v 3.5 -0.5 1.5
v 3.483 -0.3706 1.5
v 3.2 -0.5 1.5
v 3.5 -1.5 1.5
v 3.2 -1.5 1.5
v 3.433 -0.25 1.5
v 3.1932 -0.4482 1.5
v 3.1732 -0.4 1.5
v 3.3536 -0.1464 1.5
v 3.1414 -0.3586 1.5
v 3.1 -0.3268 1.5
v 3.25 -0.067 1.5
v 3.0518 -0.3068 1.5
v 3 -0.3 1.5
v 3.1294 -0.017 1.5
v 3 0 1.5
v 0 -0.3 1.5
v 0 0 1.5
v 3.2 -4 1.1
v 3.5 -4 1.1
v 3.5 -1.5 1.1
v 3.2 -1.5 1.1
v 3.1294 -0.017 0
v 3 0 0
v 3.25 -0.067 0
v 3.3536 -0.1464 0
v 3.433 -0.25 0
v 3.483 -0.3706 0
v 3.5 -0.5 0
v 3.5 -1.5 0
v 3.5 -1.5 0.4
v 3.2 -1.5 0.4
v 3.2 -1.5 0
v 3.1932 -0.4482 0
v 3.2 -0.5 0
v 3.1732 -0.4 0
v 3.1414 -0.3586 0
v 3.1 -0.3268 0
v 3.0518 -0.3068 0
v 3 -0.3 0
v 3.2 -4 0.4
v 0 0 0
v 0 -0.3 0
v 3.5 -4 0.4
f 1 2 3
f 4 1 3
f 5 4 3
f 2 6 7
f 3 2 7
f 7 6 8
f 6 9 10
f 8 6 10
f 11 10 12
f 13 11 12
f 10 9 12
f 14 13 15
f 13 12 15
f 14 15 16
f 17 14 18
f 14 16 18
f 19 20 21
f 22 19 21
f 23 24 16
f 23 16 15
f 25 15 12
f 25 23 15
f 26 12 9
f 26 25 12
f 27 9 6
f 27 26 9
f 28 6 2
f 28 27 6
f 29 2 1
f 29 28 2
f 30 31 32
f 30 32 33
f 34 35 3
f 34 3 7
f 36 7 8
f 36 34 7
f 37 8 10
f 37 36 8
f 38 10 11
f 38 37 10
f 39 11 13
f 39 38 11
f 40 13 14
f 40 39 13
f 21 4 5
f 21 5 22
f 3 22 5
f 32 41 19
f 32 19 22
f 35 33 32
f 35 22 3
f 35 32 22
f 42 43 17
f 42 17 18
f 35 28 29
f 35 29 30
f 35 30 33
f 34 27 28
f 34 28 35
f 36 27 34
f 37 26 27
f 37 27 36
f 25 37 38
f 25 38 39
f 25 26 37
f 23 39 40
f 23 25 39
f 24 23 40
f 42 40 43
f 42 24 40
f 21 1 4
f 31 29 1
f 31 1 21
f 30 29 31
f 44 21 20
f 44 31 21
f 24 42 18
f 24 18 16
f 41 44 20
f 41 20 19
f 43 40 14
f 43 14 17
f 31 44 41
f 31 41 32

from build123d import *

# Parameters (mm, degrees)
BOSS_EXTRUDE1_DEPTH = 1.5
SKETCH2_W           = 0.4
SKETCH2_H           = 2.5
CUT_EXTRUDE1_DEPTH  = 1.5


with BuildPart() as part:
    # Sketch1 → Boss-Extrude1 (new body)
    with BuildSketch(Plane.XY):
        with BuildLine():
            Line((0, 0), (3, 0))
            ThreePointArc((3, 0), (3.353553391, -0.146446609), (3.5, -0.5))
            Line((3.5, -0.5), (3.5, -4))
            Line((3.5, -4), (3.2, -4))
            Line((3.2, -4), (3.2, -0.5))
            ThreePointArc((3.2, -0.5), (3.141421356, -0.358578644), (3, -0.3))
            Line((3, -0.3), (0, -0.3))
            Line((0, -0.3), (0, 0))
        make_face()
    extrude(amount=BOSS_EXTRUDE1_DEPTH)

    # Sketch2 → Cut-Extrude1 (cut)
    with BuildSketch(Plane(origin=(3.5, 0, 0), x_dir=(0, 0, -1), z_dir=(1, 0, 0))):
        with Locations((-1.3, -2.75)):
            Rectangle(SKETCH2_W, SKETCH2_H)
        with Locations((-0.2, -2.75)):
            Rectangle(SKETCH2_W, SKETCH2_H)
    extrude(amount=-CUT_EXTRUDE1_DEPTH, mode=Mode.SUBTRACT)


solid = part.part
